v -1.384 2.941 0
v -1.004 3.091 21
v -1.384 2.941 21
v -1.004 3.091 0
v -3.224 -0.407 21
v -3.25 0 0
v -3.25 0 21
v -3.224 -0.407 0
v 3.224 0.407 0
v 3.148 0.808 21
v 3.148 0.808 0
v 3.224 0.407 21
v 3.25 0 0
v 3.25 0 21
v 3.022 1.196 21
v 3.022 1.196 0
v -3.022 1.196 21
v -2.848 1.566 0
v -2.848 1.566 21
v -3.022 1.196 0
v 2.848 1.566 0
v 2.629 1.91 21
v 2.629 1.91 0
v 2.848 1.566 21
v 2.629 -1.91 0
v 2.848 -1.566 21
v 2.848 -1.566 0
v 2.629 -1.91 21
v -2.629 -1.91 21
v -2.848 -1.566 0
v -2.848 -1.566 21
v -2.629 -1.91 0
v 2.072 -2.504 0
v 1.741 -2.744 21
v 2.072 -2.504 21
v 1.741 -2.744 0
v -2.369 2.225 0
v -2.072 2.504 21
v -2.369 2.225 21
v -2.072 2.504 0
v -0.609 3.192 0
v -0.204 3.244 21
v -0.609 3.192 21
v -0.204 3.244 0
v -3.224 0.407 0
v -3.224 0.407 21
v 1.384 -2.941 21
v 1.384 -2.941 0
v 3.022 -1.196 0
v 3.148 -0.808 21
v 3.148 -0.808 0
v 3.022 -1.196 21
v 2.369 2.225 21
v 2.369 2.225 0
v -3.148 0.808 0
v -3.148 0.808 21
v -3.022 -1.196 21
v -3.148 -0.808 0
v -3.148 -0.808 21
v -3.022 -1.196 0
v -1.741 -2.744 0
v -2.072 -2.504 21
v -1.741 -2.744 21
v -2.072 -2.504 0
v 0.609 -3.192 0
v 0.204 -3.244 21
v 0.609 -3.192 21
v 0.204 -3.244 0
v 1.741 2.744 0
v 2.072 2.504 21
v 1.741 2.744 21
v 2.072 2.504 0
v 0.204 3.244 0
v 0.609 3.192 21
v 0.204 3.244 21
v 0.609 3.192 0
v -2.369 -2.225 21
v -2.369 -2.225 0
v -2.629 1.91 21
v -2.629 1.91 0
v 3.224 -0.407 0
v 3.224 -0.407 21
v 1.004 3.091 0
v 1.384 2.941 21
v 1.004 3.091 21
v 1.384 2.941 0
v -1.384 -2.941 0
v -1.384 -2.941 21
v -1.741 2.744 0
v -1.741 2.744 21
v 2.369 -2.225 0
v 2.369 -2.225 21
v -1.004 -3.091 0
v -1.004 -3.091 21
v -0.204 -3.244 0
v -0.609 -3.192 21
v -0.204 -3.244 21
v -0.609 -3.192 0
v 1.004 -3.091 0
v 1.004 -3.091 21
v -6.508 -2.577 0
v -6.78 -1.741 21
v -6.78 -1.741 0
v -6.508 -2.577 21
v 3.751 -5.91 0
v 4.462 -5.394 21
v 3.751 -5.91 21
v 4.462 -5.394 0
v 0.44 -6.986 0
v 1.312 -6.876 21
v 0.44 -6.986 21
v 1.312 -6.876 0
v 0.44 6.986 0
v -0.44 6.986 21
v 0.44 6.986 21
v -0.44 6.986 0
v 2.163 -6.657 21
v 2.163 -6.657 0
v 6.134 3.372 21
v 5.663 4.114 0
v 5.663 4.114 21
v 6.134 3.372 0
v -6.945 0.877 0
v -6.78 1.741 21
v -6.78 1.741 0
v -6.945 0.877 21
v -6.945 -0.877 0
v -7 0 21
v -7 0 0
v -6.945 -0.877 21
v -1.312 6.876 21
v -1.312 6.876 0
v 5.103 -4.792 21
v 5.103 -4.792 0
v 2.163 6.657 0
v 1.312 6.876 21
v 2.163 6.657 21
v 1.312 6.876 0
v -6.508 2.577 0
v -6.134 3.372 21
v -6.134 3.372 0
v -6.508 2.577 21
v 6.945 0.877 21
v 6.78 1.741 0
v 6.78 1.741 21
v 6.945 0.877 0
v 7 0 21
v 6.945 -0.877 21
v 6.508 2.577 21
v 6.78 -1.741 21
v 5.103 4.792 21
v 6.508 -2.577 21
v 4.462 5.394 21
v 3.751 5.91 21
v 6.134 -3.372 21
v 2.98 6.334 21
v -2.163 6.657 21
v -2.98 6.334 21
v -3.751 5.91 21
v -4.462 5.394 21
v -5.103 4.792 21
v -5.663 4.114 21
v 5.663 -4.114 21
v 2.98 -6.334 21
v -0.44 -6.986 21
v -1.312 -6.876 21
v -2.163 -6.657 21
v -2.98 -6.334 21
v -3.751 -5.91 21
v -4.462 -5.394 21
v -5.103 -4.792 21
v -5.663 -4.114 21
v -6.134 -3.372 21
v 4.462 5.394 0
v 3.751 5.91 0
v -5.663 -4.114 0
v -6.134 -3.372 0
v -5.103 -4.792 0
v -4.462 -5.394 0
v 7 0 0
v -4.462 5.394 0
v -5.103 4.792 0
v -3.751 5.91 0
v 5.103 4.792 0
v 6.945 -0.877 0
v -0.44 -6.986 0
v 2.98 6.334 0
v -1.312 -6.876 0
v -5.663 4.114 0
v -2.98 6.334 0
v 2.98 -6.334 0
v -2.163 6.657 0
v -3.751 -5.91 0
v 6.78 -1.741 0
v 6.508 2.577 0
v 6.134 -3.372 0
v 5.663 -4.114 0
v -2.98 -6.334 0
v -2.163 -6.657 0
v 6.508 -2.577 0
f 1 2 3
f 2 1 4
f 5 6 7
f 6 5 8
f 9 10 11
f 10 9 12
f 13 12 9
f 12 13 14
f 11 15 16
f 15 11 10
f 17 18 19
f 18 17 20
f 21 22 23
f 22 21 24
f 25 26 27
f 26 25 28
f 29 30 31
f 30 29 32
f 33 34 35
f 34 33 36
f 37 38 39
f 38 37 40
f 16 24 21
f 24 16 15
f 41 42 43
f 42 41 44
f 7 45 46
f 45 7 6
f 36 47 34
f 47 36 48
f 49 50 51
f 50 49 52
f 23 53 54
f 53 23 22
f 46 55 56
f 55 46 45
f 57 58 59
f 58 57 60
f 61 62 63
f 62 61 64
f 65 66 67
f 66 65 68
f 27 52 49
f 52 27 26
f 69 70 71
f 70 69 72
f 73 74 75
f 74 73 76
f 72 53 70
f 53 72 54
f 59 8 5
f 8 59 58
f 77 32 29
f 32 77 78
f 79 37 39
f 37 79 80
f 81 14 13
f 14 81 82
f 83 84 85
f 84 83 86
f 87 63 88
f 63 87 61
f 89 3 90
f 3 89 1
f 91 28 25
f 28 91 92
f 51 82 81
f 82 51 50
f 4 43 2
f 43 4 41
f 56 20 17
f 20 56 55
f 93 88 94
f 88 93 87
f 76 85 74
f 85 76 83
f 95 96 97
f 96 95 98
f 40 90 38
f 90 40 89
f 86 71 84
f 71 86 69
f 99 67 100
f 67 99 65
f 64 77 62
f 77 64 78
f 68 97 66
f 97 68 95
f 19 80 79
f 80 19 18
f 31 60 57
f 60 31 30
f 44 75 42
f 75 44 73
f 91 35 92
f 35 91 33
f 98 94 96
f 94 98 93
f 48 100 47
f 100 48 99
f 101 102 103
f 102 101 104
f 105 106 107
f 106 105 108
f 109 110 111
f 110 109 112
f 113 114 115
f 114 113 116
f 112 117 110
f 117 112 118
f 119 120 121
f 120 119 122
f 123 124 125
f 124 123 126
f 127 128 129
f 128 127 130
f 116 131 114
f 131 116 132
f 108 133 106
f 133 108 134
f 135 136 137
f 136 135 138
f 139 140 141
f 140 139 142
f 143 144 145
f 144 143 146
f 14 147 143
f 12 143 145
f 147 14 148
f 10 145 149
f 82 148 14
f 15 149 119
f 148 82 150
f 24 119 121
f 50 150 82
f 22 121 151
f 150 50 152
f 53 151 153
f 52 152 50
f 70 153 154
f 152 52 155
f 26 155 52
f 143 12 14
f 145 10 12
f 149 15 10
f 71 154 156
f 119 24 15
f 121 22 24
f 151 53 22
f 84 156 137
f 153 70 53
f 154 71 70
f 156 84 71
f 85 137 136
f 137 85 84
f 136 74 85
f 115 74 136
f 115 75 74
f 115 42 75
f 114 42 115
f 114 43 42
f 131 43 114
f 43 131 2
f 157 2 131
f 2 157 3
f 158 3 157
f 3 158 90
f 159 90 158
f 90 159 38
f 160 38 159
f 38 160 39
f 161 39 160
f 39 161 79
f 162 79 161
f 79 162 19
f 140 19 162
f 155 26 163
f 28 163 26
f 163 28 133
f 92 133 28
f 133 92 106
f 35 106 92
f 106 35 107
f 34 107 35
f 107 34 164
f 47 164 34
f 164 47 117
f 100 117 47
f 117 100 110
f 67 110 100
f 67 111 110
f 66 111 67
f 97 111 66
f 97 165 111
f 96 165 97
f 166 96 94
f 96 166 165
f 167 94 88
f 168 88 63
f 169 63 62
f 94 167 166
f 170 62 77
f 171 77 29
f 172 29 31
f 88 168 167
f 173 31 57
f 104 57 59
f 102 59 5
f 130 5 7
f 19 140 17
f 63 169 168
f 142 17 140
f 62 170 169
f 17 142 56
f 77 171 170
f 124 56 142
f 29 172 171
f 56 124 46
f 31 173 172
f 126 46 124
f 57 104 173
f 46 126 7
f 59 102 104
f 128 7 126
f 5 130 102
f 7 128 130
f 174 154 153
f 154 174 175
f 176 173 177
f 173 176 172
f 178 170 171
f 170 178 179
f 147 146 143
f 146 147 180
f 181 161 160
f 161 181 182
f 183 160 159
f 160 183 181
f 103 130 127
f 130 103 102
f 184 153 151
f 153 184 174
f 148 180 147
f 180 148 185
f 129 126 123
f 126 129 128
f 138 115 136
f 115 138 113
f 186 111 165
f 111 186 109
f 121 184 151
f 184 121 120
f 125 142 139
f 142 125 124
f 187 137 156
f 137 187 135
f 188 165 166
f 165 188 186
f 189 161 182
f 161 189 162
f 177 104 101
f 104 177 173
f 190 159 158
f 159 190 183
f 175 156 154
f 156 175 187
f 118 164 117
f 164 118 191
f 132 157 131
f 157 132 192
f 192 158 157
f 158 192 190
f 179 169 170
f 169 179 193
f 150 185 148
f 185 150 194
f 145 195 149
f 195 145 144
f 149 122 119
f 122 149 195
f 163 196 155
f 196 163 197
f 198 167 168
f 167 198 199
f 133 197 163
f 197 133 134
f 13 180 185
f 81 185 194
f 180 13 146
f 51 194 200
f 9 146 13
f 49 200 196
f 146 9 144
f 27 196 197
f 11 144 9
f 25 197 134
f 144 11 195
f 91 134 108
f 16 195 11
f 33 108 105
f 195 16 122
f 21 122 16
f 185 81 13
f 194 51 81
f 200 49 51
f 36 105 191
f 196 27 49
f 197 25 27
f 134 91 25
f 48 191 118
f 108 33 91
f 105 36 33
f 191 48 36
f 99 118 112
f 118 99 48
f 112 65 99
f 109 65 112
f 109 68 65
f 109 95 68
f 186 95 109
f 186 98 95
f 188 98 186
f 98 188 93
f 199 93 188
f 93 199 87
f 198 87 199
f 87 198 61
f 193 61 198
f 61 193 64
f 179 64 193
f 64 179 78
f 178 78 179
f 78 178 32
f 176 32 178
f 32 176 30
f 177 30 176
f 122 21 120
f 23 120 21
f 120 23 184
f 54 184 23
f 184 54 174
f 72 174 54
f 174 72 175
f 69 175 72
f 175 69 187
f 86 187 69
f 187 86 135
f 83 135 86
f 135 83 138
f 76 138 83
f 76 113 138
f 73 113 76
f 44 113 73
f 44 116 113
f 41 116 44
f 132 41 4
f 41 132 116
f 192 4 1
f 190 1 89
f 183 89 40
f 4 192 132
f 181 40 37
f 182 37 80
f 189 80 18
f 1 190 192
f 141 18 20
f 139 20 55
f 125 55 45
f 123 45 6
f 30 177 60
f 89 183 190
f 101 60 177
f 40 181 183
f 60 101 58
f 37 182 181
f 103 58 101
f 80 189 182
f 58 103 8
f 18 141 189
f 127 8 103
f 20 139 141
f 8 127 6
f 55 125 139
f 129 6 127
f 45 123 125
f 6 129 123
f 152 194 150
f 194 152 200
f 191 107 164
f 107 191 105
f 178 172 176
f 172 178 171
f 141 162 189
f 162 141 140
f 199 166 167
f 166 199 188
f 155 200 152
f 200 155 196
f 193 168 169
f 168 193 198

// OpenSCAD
$fn = 50;


difference() {
	union() {
		*color(alpha = 1.0000000000, c = "gray") {
			translate(v = [0, 7, 0]) {
				linear_extrude(height = 1) {
					text(font = "Arial:style=Bold", halign = "center", size = 4.5000000000, text = "COMMENT plate main", valign = "center");
				}
			}
		}
		cylinder(h = 21, r = 7.0000000000);
	}
	union() {
		*color(alpha = 1.0000000000, c = "gray") {
			translate(v = [0, 7, 0]) {
				linear_extrude(height = 1) {
					text(font = "Arial:style=Bold", halign = "center", size = 4.5000000000, text = "COMMENT holes main", valign = "center");
				}
			}
		}
		translate(v = [0, 0, -100]) {
			cylinder(h = 200, r = 3.2500000000);
		}
		translate(v = [0, 0, -100]) {
			cylinder(h = 200, r = 1.8000000000);
		}
	}
}
